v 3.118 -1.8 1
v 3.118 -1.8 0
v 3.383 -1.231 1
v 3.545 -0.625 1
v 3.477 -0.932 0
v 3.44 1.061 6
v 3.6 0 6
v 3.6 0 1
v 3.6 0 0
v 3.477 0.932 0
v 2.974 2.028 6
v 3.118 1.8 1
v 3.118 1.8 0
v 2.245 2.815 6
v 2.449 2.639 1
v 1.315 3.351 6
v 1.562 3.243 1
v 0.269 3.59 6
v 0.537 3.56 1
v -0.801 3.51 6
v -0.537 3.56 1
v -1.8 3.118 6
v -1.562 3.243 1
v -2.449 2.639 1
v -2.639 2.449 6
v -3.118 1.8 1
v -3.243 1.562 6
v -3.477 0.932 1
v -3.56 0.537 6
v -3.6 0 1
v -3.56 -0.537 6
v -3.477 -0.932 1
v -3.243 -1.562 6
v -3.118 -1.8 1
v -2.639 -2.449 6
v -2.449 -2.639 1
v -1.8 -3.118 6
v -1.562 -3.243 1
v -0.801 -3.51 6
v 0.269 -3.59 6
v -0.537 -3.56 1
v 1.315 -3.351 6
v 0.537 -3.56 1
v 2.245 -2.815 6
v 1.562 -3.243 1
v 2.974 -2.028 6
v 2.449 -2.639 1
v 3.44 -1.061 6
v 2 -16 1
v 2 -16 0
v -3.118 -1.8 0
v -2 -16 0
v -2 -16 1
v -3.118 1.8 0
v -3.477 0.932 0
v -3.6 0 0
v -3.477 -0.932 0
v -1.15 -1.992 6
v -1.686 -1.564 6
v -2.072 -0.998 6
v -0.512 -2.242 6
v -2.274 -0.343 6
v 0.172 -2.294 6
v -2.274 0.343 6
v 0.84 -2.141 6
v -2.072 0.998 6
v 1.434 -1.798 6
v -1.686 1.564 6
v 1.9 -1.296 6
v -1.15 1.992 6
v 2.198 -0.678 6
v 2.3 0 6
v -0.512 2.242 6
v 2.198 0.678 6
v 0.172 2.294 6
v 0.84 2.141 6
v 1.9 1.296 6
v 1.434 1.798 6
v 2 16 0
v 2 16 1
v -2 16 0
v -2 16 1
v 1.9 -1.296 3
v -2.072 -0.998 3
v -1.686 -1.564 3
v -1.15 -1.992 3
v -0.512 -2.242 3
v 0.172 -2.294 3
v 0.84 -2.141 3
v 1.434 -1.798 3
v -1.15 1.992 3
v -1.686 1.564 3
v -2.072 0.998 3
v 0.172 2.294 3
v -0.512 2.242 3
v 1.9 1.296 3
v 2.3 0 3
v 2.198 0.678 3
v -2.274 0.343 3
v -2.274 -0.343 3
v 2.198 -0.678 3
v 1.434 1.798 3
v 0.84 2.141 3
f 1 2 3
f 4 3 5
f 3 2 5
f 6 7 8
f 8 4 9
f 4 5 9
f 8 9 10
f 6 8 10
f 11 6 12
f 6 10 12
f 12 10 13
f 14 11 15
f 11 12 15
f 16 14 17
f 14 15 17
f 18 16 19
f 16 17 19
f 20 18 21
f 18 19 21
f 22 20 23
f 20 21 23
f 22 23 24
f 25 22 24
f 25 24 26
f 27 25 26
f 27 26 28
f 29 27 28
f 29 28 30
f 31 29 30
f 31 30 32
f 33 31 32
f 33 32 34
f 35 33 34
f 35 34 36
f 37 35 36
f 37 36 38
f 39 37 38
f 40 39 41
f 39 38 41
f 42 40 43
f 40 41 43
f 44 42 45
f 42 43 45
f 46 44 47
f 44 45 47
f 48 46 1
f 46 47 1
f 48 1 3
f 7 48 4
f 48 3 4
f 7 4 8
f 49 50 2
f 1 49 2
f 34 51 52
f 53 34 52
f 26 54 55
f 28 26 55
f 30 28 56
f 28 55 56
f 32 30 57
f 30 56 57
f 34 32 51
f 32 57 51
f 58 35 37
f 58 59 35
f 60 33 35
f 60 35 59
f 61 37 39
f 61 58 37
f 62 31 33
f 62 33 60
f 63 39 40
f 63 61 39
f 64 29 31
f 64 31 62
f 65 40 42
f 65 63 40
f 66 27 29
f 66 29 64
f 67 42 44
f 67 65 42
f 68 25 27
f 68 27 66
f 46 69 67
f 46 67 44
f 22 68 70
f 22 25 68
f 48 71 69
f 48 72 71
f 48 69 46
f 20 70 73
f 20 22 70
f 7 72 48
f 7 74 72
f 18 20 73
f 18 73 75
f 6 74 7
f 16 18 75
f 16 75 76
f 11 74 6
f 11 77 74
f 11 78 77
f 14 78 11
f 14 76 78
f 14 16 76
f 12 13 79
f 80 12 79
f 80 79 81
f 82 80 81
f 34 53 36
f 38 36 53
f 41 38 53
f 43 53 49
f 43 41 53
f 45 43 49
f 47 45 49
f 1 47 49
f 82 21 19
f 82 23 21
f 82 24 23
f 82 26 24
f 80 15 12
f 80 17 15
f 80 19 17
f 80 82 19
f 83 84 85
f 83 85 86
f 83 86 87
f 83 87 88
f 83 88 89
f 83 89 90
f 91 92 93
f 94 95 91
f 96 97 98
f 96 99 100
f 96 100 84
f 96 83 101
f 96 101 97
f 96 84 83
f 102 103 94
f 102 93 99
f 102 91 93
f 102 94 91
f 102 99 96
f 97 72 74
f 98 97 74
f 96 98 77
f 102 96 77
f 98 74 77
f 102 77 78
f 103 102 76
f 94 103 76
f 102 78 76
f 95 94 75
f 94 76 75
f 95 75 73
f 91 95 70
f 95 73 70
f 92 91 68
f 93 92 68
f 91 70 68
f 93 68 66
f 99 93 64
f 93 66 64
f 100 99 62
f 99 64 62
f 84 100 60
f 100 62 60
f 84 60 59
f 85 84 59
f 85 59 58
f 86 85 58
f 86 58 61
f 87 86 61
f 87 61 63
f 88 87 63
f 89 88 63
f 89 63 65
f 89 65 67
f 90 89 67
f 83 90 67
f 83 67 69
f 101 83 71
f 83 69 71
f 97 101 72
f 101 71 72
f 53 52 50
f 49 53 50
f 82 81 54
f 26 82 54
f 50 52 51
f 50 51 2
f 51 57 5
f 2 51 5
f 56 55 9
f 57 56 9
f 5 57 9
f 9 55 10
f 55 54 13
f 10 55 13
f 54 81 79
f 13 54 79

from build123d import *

# Parameters (mm, degrees)
SALIENTE_EXTRUIR1_DEPTH = 1
CROQUIS2_R              = 3.6
SALIENTE_EXTRUIR2_DEPTH = 5
CROQUIS3_R              = 2.3
CORTAR_EXTRUIR1_DEPTH   = 3


with BuildPart() as part:
    # Croquis1 → Saliente-Extruir1 (new body)
    with BuildSketch(Plane.XY):
        with BuildLine():
            Line((-2, -16), (2, -16))
            Line((2, -16), (3.117691454, -1.8))
            ThreePointArc((3.117691454, -1.8), (3.6, 0), (3.117691454, 1.8))
            Line((3.117691454, 1.8), (2, 16))
            Line((2, 16), (-2, 16))
            Line((-2, 16), (-3.117691454, 1.8))
            ThreePointArc((-3.117691454, 1.8), (-3.6, 0), (-3.117691454, -1.8))
            Line((-3.117691454, -1.8), (-2, -16))
        make_face()
    extrude(amount=SALIENTE_EXTRUIR1_DEPTH)

    # Croquis2 → Saliente-Extruir2 (add)
    with BuildSketch(Plane.XY.offset(1)):
        Circle(CROQUIS2_R)
    extrude(amount=SALIENTE_EXTRUIR2_DEPTH)

    # Croquis3 → Cortar-Extruir1 (cut)
    with BuildSketch(Plane.XY.offset(6)):
        Circle(CROQUIS3_R)
    extrude(amount=-CORTAR_EXTRUIR1_DEPTH, mode=Mode.SUBTRACT)


solid = part.part
